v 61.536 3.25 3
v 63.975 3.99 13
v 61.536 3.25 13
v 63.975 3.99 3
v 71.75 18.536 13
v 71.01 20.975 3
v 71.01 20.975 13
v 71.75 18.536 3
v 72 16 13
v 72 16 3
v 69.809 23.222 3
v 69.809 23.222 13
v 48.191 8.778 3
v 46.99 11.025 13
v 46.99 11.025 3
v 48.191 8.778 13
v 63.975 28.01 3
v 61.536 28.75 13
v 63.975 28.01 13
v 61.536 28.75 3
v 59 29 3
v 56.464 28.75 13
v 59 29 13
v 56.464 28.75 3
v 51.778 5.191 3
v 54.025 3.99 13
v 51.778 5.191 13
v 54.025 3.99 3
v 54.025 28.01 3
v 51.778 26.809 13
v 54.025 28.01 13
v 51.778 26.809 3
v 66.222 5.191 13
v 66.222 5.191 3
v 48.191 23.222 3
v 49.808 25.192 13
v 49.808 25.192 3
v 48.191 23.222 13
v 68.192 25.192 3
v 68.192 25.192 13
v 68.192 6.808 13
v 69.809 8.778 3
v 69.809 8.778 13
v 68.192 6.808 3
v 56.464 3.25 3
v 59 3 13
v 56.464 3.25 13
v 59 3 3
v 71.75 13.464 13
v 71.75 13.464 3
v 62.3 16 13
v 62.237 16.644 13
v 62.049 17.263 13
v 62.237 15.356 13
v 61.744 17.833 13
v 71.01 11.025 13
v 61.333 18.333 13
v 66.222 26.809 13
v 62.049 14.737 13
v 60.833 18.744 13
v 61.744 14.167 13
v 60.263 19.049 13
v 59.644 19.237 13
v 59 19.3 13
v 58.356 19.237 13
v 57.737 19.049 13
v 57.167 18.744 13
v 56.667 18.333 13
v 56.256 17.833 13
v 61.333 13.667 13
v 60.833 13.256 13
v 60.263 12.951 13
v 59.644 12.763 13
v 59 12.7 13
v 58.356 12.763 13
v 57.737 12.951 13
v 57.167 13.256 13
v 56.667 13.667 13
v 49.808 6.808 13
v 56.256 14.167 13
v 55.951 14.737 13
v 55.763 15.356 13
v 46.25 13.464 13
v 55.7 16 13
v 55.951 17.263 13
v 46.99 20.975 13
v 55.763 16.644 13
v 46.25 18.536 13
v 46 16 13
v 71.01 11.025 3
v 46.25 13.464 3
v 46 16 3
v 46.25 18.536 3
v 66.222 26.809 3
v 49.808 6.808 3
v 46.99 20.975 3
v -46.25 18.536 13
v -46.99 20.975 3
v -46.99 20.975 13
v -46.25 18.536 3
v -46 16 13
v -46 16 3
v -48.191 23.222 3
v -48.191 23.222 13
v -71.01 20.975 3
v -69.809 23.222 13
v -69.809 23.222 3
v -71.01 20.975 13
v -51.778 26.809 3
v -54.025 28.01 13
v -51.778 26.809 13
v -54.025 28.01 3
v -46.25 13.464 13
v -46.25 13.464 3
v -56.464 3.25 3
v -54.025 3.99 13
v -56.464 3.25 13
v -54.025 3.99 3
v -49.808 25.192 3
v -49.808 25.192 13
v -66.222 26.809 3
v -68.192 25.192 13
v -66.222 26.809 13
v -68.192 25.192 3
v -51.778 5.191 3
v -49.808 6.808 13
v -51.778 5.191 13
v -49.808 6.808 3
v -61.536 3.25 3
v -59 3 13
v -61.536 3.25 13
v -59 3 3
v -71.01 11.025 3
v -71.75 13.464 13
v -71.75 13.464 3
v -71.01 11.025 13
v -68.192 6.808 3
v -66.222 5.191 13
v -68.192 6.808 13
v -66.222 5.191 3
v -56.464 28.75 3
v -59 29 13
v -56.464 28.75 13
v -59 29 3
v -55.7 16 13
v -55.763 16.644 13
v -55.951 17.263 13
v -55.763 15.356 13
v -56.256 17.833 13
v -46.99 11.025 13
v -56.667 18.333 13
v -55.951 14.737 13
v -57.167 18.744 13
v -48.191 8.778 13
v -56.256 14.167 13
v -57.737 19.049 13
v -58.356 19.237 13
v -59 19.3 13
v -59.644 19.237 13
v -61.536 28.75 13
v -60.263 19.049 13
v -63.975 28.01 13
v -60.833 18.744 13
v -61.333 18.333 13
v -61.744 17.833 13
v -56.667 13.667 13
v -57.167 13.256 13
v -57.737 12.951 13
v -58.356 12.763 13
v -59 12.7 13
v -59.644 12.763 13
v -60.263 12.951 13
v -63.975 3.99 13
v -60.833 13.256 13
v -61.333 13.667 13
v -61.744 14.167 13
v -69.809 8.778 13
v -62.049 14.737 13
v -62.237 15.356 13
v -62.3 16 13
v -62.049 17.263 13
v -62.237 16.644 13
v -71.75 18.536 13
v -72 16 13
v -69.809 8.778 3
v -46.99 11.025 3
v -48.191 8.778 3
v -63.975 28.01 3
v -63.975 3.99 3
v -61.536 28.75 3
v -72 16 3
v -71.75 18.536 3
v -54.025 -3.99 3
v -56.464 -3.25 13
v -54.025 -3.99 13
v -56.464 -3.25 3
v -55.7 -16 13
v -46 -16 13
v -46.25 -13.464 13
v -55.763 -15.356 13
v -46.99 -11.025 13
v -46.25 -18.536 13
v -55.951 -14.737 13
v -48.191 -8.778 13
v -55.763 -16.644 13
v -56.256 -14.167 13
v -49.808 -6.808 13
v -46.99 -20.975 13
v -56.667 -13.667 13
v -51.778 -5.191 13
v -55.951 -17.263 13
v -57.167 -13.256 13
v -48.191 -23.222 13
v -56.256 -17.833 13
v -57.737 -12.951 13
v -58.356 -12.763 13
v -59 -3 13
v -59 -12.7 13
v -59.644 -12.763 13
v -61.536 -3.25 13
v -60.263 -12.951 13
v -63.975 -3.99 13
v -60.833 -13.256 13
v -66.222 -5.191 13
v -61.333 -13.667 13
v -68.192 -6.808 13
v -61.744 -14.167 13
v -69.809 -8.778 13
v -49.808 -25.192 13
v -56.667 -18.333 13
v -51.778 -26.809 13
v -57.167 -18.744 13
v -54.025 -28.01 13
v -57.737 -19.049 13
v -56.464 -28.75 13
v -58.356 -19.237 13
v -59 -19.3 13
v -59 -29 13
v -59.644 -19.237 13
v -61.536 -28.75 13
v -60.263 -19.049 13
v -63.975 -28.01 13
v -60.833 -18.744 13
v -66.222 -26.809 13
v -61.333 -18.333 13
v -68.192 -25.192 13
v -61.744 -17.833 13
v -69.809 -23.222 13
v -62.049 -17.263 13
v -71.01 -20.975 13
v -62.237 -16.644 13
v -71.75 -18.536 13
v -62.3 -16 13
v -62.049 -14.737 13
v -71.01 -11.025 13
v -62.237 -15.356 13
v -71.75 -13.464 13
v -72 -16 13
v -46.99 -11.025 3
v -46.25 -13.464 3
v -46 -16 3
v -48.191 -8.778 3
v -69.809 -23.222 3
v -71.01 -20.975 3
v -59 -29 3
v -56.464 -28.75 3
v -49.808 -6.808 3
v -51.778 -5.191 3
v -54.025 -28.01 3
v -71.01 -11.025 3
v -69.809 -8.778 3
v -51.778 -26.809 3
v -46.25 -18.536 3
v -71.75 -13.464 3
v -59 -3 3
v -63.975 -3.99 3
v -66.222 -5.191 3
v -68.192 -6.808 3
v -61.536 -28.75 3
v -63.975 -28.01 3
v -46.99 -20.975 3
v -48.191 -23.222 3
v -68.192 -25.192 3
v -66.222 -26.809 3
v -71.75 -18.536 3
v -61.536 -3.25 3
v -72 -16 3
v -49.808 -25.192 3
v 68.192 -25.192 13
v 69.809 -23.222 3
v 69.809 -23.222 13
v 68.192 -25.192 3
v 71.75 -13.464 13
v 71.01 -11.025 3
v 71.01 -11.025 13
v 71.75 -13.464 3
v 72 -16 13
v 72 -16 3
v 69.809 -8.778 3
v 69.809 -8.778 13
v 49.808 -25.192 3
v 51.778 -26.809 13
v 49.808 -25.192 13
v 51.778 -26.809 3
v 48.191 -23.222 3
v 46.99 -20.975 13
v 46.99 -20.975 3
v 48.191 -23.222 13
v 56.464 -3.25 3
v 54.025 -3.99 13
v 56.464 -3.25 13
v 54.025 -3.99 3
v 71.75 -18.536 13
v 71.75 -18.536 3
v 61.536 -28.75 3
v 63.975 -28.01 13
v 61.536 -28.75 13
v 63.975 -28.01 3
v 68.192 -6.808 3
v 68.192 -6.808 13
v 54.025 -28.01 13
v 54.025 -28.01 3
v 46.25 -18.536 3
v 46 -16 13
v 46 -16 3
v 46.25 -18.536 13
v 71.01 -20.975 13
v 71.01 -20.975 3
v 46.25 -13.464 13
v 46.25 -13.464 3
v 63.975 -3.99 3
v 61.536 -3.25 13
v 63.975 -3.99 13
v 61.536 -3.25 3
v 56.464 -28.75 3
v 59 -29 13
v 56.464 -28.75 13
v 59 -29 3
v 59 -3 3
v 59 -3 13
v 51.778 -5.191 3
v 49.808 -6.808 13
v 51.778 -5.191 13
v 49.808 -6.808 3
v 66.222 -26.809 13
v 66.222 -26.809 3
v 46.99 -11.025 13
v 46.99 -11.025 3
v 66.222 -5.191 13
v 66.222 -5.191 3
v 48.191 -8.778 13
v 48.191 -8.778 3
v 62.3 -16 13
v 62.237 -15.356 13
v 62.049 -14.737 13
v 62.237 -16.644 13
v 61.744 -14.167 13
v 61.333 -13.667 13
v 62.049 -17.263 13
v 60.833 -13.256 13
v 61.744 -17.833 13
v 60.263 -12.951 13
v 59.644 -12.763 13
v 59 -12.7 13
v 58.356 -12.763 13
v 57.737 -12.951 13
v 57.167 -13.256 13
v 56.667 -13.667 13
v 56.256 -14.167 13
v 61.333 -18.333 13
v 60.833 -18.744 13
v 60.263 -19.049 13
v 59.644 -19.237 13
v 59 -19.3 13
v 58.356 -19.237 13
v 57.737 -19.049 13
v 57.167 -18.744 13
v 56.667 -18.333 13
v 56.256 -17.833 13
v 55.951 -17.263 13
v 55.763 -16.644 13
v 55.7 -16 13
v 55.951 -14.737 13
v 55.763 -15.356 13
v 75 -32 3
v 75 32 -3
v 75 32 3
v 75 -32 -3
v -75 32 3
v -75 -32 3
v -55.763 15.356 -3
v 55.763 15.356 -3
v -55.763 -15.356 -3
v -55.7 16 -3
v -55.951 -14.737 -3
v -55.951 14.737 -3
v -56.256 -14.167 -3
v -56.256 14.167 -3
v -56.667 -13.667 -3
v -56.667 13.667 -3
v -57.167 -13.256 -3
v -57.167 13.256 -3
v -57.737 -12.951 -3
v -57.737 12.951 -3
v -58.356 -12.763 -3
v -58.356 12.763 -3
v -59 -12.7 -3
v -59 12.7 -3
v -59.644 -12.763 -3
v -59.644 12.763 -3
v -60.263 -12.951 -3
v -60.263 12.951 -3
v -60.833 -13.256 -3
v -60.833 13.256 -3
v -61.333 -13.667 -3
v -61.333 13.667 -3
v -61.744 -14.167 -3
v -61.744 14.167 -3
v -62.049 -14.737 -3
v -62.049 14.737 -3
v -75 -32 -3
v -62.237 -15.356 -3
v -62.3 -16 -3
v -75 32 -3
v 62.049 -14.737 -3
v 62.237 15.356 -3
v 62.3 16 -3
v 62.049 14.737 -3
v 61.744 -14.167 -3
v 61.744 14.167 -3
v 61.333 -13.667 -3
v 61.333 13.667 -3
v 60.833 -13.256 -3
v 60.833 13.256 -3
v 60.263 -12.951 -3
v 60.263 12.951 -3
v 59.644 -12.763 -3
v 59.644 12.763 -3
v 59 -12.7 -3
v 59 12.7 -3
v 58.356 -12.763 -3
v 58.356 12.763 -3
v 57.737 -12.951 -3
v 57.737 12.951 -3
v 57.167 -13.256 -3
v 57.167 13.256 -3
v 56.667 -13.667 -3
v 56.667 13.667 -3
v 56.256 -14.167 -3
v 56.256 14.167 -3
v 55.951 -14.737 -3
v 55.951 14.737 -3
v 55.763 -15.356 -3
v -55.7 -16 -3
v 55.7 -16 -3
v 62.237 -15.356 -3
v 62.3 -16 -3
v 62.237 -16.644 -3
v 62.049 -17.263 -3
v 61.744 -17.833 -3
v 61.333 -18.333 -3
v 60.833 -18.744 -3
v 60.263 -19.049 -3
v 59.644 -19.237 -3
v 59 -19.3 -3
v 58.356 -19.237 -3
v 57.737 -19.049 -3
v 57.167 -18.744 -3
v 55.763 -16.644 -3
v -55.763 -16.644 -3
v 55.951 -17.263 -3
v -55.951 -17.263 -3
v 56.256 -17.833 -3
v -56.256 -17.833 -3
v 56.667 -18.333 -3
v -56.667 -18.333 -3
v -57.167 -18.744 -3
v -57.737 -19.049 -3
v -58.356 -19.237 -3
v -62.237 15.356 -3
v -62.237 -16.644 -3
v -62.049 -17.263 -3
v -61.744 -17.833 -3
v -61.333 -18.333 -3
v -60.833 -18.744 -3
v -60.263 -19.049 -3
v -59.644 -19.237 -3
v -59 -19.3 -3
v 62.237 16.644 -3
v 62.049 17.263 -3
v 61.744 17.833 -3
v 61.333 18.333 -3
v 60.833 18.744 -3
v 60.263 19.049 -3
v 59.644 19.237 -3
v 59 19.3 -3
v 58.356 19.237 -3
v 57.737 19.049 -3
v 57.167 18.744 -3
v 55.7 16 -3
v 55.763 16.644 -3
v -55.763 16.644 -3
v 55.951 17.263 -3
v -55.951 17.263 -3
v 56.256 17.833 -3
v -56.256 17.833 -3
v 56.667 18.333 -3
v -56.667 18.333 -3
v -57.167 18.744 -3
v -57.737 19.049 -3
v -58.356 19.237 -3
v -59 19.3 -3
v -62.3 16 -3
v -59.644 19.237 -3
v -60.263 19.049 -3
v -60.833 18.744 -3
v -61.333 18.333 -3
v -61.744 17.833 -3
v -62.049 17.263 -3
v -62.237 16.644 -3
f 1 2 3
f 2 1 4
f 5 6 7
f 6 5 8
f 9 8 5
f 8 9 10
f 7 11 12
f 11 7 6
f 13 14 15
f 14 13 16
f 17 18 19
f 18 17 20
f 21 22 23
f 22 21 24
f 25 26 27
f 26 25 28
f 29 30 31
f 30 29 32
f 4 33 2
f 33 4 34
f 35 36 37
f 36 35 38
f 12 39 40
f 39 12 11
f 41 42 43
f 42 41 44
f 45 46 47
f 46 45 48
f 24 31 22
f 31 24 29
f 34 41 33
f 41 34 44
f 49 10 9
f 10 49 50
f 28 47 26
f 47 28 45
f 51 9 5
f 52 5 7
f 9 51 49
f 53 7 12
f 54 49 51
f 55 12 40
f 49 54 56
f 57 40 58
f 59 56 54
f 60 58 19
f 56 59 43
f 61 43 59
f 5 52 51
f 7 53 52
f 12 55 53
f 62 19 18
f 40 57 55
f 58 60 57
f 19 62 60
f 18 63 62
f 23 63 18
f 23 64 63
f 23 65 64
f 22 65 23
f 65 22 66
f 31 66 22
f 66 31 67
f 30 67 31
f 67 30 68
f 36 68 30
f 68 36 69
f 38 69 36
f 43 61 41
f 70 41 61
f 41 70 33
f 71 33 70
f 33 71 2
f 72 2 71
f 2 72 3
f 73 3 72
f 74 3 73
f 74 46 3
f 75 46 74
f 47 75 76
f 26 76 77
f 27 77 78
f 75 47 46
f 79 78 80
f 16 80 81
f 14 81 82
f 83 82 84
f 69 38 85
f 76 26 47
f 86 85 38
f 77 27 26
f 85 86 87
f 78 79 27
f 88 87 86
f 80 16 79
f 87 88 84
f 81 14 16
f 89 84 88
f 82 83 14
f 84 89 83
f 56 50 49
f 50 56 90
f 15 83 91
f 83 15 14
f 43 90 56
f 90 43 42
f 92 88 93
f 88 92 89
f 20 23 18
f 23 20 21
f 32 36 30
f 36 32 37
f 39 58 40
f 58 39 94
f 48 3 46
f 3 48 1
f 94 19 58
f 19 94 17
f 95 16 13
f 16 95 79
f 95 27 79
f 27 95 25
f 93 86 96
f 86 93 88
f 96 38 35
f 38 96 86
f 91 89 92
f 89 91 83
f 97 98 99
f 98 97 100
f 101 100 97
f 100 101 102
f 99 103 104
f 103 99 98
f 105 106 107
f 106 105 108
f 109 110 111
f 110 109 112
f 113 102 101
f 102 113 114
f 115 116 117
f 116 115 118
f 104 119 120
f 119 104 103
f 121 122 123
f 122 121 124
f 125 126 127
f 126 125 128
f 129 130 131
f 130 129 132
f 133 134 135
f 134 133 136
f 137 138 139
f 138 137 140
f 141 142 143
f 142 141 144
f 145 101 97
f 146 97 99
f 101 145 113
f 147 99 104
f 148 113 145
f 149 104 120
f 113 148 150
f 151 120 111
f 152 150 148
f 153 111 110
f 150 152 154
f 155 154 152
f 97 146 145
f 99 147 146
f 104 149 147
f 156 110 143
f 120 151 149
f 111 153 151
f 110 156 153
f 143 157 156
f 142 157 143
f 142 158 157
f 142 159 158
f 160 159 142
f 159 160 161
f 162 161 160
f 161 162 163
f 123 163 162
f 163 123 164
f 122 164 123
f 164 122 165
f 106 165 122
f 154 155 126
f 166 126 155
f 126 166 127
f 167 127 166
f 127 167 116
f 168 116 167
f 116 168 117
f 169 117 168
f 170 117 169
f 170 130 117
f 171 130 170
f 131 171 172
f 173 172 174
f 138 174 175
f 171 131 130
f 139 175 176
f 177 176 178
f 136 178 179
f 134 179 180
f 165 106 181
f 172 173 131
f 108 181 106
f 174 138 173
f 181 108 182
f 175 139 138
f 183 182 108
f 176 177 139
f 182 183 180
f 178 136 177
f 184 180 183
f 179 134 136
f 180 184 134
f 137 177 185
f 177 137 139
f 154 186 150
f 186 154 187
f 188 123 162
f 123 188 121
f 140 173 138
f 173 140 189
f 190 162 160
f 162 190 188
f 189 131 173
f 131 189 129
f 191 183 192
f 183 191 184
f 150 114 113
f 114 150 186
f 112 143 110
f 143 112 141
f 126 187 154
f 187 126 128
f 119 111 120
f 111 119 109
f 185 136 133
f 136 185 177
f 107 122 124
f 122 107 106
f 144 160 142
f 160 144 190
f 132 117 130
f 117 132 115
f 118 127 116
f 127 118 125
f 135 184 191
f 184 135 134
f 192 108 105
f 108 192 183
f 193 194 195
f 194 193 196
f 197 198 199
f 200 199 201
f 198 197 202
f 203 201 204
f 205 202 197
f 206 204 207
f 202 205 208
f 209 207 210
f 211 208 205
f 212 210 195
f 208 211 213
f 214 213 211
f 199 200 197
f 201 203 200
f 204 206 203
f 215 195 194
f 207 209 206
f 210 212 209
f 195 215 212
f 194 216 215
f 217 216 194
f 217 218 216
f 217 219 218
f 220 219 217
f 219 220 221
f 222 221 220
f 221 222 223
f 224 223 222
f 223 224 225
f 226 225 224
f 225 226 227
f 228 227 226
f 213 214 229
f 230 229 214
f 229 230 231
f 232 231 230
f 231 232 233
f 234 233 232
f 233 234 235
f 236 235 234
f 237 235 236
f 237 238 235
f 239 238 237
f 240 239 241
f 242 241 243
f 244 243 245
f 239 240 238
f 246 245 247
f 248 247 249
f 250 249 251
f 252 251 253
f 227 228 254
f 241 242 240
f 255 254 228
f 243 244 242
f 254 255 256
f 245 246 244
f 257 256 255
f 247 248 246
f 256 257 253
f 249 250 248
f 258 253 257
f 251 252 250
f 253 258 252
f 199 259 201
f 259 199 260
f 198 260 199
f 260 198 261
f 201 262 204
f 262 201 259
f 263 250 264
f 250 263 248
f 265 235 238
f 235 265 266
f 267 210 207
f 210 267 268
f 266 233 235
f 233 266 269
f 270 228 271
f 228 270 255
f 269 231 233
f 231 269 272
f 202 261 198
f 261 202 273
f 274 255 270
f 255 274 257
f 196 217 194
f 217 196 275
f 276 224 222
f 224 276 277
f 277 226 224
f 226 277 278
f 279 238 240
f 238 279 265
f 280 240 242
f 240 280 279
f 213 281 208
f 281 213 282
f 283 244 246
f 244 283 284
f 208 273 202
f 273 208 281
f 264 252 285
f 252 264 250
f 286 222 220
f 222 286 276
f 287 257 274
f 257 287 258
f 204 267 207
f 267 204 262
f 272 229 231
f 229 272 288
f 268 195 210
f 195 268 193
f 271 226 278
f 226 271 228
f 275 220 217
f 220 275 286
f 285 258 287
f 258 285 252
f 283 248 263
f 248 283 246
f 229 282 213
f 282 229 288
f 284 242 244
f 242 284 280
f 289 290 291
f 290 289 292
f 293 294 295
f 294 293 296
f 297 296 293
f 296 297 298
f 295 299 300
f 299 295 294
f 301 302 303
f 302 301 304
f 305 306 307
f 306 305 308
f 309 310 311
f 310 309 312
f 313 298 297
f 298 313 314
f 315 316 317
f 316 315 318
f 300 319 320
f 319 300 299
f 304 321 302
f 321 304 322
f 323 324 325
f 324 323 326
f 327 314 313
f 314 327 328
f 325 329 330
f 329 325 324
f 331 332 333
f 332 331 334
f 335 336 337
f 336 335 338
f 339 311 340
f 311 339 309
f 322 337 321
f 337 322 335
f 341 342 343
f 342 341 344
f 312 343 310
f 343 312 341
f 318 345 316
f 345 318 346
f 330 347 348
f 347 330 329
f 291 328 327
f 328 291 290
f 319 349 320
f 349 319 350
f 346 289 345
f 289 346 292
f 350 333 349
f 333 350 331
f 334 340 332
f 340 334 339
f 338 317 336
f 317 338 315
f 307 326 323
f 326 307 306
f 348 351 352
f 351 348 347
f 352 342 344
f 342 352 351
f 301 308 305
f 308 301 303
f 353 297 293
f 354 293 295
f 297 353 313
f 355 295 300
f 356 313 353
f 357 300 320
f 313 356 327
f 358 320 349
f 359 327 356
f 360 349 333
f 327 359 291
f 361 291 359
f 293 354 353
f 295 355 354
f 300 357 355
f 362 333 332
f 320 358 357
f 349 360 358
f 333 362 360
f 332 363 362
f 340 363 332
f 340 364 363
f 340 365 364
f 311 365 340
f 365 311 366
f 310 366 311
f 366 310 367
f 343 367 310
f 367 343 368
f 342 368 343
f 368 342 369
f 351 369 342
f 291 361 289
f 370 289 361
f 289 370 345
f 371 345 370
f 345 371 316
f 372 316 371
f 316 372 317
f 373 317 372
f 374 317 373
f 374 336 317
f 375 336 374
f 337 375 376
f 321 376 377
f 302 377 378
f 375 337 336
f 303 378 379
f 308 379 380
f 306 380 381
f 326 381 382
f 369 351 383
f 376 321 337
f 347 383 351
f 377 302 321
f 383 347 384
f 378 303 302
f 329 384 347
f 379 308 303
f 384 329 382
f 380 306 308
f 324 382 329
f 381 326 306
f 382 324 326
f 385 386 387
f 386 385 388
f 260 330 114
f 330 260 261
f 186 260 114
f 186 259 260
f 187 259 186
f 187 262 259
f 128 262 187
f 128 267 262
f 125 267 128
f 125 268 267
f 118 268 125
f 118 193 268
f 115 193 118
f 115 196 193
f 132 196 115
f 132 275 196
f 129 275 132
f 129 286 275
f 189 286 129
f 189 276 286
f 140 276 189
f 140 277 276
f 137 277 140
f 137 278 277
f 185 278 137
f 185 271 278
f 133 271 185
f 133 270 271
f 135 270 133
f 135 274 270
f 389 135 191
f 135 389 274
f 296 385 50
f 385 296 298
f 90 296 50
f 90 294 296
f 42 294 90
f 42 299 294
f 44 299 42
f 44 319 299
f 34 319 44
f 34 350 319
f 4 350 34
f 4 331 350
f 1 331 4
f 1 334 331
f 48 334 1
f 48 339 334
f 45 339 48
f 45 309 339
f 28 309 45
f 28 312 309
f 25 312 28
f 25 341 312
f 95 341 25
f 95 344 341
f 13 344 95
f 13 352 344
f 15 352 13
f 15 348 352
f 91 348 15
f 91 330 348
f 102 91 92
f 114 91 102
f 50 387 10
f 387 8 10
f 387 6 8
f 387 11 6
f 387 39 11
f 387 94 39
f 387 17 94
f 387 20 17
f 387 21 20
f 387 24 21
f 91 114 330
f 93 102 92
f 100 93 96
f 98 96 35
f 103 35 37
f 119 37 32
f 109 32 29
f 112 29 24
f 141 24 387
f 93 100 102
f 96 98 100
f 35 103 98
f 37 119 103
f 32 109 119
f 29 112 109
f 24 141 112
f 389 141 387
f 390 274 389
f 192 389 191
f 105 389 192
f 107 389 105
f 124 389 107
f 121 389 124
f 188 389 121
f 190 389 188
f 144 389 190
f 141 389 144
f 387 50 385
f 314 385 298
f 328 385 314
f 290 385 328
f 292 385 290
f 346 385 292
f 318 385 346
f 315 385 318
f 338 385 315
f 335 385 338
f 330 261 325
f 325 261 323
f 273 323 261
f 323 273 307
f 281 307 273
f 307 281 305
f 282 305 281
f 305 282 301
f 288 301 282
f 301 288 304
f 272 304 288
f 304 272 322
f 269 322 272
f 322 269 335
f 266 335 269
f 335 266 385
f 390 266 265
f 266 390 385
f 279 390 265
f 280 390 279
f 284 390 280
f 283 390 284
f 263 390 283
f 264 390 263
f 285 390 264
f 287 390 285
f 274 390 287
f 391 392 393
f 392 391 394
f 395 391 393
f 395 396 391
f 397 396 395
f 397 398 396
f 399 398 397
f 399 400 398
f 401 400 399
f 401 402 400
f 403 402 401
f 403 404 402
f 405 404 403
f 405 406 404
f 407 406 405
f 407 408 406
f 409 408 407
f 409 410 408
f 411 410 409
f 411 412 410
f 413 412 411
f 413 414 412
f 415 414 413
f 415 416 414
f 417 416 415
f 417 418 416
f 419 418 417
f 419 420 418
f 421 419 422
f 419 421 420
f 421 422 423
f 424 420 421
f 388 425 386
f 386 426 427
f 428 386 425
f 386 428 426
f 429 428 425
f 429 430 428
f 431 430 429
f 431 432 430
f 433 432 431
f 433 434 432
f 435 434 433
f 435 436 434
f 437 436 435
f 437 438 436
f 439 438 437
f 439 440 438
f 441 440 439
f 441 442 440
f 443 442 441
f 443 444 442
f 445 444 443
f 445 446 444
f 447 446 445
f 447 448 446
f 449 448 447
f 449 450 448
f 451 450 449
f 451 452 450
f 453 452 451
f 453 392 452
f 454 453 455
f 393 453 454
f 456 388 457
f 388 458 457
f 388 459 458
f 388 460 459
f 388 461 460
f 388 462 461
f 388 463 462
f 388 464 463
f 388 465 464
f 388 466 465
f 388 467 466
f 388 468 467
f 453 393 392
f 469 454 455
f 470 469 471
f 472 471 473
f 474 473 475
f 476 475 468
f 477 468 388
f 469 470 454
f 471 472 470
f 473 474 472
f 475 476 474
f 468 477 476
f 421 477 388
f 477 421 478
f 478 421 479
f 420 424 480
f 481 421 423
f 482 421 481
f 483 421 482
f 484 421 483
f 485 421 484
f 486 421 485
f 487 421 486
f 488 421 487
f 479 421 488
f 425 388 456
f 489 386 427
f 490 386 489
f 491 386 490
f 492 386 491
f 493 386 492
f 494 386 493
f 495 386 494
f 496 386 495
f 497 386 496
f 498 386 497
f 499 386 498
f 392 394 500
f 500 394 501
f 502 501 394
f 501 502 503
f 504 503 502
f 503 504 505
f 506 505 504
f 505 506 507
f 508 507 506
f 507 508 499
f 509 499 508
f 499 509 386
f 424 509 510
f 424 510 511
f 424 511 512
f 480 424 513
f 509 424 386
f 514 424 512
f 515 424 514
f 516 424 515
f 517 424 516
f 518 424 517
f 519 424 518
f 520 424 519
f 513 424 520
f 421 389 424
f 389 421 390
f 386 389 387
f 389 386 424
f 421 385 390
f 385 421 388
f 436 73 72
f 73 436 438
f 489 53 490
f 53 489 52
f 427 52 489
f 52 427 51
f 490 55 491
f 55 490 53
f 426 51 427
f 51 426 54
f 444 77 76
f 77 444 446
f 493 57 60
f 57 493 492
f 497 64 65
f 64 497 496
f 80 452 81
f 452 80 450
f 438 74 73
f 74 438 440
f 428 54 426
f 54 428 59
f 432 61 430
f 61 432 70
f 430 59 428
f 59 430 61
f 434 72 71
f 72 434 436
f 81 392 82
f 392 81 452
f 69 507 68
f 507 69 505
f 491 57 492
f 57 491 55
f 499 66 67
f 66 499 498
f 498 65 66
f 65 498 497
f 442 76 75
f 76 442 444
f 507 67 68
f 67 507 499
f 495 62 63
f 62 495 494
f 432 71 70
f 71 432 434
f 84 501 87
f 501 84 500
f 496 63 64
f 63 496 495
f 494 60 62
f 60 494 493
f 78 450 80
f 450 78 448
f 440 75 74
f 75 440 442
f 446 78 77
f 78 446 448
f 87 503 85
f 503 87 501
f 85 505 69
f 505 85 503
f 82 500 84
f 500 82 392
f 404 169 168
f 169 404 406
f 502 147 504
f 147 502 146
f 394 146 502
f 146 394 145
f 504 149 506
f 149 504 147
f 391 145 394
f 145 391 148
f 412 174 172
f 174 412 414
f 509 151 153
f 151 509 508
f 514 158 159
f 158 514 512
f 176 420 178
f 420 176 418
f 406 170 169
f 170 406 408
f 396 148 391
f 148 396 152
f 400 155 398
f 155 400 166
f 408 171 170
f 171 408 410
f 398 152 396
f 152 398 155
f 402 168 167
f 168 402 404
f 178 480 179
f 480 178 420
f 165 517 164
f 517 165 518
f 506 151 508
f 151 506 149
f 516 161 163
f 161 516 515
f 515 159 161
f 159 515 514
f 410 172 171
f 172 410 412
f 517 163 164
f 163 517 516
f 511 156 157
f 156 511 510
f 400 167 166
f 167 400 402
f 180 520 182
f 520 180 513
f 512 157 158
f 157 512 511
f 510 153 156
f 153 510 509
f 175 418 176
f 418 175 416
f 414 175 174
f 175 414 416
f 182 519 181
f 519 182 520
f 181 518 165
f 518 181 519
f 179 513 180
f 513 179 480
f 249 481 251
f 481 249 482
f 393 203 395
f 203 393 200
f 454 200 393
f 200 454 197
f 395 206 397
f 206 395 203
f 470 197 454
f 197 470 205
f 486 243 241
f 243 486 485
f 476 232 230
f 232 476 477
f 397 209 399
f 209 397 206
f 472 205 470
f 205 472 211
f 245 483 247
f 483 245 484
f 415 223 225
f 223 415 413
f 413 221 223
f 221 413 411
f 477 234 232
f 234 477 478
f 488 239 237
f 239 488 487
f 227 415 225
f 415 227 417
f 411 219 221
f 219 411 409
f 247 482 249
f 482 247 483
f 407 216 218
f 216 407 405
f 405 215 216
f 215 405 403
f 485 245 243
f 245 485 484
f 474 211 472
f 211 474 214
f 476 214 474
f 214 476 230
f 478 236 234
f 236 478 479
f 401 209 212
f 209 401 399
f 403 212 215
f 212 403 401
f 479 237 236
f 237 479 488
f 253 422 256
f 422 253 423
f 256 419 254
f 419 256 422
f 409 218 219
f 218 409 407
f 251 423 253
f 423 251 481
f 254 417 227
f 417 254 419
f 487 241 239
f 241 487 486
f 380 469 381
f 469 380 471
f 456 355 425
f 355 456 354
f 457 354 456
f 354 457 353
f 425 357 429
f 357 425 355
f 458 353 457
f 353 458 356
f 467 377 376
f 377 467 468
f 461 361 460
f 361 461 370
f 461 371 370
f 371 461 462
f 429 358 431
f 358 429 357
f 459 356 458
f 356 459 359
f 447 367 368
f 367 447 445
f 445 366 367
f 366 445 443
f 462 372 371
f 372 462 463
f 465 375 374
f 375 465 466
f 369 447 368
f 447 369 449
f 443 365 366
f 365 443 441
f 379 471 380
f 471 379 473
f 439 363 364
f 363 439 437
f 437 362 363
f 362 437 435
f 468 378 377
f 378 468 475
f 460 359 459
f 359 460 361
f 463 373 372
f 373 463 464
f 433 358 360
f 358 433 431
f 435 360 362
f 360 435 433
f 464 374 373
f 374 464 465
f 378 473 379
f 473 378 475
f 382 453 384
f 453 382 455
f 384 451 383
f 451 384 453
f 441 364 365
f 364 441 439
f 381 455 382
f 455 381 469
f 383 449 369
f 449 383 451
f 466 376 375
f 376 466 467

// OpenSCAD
$fn = 32;

// ----------------------------------------------------------------------
// Anchor pads 150 x 64 x 16
// four corner bosses with anchor holes
// ----------------------------------------------------------------------

// --- parameters (mm) ---
plate = [150, 64, 6];  // base plate size (x, y, z)
pads = 4;              // boss count, one per corner
edge = 16;             // boss centre offset from the plate edge
boss_d = 26;           // boss diameter
boss_h = 10;           // boss height above the base plate
hole_d = 6.6;          // hole diameter

// --- derived feature positions (mm) ---
height = plate[2] + boss_h;      // = 16   overall height of the part
corner_x = plate[0] / 2 - edge;  // = 59   boss centre X
corner_y = plate[1] / 2 - edge;  // = 16   boss centre Y
feature_centers = [
  [corner_x, corner_y],
  [-corner_x, corner_y],
  [-corner_x, -corner_y],
  [corner_x, -corner_y]
];   // boss centres, anchor holes are drilled there

// base plate, four bosses standing on it, anchor holes all the way through
difference() {
  union() {
    cube(plate, center = true);
    for (centre = feature_centers)
      translate([centre[0], centre[1], plate[2] / 2 - 1])
        cylinder(d = boss_d, h = boss_h + 1);
  }
  for (centre = feature_centers)
    translate([centre[0], centre[1], -height])
      cylinder(d = hole_d, h = 2 * height + 2);  // through boss and plate
}
